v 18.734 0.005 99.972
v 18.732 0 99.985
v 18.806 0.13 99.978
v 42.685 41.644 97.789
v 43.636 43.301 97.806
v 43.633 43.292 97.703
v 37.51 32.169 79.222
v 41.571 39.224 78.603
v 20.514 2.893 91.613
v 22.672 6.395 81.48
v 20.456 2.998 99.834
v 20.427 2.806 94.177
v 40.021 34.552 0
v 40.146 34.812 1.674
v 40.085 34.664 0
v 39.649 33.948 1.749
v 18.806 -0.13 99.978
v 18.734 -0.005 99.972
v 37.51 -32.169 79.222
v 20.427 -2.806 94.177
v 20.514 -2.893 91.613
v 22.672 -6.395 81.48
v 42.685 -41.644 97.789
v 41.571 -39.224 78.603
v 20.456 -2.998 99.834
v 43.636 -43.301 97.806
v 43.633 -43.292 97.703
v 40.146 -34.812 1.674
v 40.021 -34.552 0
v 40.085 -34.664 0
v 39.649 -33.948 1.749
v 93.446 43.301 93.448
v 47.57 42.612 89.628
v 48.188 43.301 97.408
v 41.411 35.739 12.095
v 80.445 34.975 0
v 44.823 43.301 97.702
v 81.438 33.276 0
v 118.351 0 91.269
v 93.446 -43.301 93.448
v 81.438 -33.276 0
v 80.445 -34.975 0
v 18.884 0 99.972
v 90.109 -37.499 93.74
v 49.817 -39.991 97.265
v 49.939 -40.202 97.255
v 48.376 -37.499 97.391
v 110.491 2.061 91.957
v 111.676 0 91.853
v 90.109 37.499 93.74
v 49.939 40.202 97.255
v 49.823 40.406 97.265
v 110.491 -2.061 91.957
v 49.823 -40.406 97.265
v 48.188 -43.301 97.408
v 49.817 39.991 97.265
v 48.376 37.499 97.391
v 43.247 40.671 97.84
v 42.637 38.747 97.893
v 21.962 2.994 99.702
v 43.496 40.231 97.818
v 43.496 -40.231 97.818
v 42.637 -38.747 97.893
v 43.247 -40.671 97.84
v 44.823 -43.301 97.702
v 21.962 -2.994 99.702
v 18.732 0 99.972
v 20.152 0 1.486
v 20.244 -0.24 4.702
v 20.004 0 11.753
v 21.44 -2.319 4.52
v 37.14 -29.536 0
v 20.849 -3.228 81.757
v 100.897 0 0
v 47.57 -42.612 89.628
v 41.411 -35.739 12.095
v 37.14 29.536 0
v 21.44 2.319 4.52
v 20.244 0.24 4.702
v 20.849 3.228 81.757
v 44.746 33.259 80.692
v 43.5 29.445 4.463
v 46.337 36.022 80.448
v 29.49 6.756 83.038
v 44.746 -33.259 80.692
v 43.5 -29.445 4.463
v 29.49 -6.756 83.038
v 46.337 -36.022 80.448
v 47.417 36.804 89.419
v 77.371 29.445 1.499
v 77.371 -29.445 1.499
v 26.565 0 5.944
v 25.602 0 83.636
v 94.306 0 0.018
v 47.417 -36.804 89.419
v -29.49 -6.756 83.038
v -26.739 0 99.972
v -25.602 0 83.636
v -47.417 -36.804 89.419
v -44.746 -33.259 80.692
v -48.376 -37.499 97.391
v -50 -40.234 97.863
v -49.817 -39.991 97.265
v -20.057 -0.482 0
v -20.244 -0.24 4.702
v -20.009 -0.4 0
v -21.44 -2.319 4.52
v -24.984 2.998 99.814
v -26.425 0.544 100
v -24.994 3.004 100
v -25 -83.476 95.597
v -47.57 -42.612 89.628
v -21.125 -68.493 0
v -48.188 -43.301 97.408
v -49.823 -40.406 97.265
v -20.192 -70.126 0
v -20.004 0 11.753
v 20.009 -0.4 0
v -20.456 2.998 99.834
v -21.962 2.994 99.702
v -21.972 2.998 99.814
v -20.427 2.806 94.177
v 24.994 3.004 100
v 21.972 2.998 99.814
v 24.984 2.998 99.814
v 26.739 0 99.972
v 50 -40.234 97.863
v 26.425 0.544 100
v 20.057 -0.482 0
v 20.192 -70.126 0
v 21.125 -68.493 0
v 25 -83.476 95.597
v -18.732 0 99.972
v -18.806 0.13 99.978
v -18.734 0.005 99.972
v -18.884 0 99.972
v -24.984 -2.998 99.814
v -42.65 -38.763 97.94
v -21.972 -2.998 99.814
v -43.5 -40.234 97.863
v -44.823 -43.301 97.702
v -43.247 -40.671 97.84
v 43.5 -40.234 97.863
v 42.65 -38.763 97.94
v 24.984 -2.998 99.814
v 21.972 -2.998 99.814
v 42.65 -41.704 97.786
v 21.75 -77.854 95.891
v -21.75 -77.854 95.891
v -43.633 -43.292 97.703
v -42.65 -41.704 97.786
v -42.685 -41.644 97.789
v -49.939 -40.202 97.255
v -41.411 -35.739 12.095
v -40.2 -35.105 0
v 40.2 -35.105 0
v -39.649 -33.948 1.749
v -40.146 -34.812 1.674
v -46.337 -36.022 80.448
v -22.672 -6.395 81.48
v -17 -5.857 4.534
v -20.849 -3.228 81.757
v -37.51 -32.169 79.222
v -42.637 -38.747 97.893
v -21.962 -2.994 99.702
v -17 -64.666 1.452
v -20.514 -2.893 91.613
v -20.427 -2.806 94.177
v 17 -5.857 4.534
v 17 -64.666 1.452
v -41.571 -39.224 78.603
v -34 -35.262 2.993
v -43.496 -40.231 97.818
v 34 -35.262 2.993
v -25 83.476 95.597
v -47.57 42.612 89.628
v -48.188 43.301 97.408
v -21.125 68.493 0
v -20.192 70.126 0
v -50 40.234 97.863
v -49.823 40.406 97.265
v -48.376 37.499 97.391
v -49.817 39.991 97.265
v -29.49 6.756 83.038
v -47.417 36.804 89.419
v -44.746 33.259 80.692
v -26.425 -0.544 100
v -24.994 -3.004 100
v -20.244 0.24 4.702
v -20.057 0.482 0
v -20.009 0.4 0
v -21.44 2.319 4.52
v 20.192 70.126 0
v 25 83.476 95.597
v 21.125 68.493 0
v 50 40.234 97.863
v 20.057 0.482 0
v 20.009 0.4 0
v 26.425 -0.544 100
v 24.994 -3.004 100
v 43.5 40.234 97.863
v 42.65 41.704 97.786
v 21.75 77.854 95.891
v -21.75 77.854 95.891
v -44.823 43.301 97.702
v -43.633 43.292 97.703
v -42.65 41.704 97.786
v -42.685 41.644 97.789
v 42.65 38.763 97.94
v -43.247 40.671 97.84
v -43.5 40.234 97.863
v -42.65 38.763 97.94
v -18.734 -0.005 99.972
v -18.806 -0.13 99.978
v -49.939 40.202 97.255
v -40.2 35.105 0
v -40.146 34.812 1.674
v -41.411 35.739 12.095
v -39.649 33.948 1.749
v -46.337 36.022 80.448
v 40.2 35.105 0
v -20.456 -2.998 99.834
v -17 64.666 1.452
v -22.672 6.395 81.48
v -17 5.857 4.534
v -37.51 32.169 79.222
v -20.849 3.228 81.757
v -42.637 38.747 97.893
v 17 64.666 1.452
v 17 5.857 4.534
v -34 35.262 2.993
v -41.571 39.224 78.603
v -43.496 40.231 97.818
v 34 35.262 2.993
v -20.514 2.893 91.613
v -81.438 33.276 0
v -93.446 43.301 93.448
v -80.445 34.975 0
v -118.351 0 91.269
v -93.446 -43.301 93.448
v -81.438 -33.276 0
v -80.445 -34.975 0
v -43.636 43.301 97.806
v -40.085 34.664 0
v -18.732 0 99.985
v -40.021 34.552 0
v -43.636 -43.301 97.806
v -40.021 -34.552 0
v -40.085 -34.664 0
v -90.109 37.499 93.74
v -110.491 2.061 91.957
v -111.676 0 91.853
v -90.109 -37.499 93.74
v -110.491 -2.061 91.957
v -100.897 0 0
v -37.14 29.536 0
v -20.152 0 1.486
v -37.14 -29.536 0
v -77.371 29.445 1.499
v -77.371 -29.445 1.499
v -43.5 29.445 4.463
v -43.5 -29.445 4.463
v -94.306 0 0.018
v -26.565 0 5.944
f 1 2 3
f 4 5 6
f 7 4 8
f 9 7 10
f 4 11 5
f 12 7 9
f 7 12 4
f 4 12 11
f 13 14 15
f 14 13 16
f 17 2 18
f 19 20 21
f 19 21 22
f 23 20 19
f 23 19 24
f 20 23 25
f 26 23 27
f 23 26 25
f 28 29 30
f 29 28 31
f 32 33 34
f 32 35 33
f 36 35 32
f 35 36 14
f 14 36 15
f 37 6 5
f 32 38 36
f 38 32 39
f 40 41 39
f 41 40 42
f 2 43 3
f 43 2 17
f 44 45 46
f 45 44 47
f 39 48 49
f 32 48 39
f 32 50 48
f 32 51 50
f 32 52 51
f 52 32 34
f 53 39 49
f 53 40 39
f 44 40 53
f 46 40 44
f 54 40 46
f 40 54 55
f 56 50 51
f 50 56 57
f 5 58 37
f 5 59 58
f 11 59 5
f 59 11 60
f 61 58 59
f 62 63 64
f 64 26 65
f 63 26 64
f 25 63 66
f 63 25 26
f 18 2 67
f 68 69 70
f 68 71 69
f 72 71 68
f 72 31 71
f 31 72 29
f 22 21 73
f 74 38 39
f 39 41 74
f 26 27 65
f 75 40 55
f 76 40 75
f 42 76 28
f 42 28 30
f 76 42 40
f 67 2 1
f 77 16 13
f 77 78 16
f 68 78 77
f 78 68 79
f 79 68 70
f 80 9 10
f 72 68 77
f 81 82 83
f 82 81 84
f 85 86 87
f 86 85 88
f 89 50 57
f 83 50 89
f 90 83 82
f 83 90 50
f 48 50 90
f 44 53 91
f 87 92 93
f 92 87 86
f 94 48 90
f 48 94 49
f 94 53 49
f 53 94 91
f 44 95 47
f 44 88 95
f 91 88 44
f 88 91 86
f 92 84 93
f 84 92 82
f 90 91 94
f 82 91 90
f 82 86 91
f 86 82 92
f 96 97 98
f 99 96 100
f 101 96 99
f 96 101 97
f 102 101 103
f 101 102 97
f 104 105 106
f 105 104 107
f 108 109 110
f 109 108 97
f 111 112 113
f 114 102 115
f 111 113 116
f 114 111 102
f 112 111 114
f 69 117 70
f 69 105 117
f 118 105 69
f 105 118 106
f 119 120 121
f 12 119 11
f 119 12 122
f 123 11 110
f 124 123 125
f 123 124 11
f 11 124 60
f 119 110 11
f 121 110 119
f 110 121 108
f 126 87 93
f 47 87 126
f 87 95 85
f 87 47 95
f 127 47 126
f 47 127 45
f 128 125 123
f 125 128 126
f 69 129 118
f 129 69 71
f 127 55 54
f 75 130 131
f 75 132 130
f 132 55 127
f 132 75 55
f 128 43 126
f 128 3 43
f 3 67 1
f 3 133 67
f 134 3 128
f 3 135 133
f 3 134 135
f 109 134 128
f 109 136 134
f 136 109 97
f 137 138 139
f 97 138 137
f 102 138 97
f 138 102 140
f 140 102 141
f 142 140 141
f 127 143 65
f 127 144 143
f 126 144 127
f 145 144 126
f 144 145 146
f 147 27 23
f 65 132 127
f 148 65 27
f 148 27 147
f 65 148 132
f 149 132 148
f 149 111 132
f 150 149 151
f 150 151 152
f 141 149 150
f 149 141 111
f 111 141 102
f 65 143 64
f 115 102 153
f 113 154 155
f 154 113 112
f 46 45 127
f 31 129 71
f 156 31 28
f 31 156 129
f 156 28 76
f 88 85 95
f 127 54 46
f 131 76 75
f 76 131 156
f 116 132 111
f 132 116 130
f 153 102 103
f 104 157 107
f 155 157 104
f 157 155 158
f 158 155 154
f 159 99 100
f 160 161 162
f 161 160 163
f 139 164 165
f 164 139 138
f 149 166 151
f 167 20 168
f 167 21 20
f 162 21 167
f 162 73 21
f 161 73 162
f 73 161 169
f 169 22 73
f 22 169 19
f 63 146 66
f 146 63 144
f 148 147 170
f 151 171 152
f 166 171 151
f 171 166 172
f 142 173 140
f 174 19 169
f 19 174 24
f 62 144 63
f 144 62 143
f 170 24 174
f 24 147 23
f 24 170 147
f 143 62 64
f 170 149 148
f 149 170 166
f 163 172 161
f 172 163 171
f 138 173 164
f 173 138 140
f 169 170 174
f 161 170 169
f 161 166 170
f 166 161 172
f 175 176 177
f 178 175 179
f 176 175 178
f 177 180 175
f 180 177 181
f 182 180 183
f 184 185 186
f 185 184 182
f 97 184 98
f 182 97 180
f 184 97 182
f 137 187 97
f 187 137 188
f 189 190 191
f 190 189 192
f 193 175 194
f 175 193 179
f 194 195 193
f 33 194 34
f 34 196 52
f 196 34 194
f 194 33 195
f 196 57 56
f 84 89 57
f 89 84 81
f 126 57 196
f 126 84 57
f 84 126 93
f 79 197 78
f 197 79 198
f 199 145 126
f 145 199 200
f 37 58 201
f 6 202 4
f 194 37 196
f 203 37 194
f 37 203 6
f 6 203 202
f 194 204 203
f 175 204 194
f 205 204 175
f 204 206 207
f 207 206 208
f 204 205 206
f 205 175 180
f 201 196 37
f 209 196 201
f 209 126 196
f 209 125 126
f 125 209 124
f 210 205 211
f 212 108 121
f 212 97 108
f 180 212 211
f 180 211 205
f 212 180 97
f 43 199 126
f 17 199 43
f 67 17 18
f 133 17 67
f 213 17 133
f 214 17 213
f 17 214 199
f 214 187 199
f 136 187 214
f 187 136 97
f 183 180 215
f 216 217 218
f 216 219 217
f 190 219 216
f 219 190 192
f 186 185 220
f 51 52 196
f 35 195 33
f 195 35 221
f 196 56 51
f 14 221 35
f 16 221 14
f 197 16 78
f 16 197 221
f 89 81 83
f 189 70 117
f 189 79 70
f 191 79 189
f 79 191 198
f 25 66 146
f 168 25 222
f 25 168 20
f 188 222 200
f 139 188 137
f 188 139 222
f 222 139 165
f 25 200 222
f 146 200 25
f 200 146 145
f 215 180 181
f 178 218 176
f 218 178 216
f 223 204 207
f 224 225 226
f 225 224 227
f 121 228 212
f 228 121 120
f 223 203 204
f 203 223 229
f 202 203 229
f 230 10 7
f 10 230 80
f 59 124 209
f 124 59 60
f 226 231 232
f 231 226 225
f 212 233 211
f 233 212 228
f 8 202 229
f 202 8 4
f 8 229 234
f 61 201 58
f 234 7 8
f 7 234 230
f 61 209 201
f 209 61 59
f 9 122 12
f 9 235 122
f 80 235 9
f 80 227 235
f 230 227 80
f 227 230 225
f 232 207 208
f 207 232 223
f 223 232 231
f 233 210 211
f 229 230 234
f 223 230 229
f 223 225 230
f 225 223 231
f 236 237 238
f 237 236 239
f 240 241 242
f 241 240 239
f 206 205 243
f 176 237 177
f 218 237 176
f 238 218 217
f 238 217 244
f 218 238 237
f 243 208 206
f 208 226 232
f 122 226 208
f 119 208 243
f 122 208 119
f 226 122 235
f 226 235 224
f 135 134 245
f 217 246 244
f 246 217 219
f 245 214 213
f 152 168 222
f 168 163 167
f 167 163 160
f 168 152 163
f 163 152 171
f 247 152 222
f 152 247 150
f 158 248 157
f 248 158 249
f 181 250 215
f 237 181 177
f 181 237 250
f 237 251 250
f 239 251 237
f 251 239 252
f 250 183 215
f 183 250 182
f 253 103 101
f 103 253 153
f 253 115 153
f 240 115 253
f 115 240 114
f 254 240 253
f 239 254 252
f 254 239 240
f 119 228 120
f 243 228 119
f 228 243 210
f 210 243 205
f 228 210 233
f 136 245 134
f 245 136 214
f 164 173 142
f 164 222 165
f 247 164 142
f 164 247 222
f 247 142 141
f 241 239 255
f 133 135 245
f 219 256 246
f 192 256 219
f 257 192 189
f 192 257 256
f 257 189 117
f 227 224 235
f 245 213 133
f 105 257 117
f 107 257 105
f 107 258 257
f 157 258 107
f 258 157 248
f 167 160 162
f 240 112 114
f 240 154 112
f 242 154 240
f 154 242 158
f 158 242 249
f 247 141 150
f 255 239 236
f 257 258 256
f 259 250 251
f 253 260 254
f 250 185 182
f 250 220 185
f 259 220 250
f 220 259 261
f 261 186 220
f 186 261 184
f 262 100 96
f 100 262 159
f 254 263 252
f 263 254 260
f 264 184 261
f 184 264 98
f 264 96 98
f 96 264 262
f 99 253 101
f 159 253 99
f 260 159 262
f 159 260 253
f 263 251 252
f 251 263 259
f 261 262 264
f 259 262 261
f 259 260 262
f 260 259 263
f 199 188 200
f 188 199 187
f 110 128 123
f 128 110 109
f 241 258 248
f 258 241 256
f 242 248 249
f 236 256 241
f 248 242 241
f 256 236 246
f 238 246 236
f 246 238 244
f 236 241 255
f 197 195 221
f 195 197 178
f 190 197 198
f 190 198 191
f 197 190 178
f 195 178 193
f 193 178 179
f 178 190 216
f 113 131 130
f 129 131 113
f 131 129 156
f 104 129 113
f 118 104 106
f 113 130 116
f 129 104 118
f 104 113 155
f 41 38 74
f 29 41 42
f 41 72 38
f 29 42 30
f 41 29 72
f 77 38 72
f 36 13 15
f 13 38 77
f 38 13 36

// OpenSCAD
use <../libs/pw_primitives.scad>;

* intersection() {
    union() {
        translate([60, 0, -2]) rotate([0, 5, 0]) difference() {
            tapered_hexagon(40, 50, 100-2);
            translate([0, 0, 5]) tapered_hexagon(40-6, 50-6, 100);
        }
        translate([0, -35, -2]) rotate([3, 0, 0]) difference() {
            tapered_hexagon(40, 50, 100);
            translate([0, 0, 5]) tapered_hexagon(40-6, 50-6, 100);
        }
        translate([0, 35, -2]) rotate([-3, 0, 0]) difference() {
            tapered_hexagon(40, 50, 100);
            translate([0, 0, 5]) tapered_hexagon(40-6, 50-6, 100);
        }
        translate([-60, 0, -2]) rotate([0, -5, 0]) difference() {
            tapered_hexagon(40, 50, 100-2);
            translate([0, 0, 5]) tapered_hexagon(40-6, 50-6, 100);
        }
    }
    translate([0, 0, 50]) cube([240, 170, 100], center=true);
}

intersection() {
    union() {
        translate([60, 0, -2]) rotate([0, 5, 0]) difference() {
            tapered_hexagon(40, 50, 100-2);
            translate([0, 0, 5]) tapered_hexagon(40-6, 50-6, 100);
        }
        translate([0, -35, -2]) rotate([3, 0, 0]) difference() {
            tapered_hexagon(40, 50, 100);
            translate([0, 0, 5]) tapered_hexagon(40-6, 50-6, 100);
        }
        translate([0, 35, -2]) rotate([-3, 0, 0]) difference() {
            tapered_hexagon(40, 50, 100);
            translate([0, 0, 5]) tapered_hexagon(40-6, 50-6, 100);
        }
        translate([-60, 0, -2]) rotate([0, -5, 0]) difference() {
            tapered_hexagon(40, 50, 100-2);
            translate([0, 0, 5]) tapered_hexagon(40-6, 50-6, 100);
        }
    }
    translate([0, 0, 50]) cube([240, 170, 100], center=true);
}
